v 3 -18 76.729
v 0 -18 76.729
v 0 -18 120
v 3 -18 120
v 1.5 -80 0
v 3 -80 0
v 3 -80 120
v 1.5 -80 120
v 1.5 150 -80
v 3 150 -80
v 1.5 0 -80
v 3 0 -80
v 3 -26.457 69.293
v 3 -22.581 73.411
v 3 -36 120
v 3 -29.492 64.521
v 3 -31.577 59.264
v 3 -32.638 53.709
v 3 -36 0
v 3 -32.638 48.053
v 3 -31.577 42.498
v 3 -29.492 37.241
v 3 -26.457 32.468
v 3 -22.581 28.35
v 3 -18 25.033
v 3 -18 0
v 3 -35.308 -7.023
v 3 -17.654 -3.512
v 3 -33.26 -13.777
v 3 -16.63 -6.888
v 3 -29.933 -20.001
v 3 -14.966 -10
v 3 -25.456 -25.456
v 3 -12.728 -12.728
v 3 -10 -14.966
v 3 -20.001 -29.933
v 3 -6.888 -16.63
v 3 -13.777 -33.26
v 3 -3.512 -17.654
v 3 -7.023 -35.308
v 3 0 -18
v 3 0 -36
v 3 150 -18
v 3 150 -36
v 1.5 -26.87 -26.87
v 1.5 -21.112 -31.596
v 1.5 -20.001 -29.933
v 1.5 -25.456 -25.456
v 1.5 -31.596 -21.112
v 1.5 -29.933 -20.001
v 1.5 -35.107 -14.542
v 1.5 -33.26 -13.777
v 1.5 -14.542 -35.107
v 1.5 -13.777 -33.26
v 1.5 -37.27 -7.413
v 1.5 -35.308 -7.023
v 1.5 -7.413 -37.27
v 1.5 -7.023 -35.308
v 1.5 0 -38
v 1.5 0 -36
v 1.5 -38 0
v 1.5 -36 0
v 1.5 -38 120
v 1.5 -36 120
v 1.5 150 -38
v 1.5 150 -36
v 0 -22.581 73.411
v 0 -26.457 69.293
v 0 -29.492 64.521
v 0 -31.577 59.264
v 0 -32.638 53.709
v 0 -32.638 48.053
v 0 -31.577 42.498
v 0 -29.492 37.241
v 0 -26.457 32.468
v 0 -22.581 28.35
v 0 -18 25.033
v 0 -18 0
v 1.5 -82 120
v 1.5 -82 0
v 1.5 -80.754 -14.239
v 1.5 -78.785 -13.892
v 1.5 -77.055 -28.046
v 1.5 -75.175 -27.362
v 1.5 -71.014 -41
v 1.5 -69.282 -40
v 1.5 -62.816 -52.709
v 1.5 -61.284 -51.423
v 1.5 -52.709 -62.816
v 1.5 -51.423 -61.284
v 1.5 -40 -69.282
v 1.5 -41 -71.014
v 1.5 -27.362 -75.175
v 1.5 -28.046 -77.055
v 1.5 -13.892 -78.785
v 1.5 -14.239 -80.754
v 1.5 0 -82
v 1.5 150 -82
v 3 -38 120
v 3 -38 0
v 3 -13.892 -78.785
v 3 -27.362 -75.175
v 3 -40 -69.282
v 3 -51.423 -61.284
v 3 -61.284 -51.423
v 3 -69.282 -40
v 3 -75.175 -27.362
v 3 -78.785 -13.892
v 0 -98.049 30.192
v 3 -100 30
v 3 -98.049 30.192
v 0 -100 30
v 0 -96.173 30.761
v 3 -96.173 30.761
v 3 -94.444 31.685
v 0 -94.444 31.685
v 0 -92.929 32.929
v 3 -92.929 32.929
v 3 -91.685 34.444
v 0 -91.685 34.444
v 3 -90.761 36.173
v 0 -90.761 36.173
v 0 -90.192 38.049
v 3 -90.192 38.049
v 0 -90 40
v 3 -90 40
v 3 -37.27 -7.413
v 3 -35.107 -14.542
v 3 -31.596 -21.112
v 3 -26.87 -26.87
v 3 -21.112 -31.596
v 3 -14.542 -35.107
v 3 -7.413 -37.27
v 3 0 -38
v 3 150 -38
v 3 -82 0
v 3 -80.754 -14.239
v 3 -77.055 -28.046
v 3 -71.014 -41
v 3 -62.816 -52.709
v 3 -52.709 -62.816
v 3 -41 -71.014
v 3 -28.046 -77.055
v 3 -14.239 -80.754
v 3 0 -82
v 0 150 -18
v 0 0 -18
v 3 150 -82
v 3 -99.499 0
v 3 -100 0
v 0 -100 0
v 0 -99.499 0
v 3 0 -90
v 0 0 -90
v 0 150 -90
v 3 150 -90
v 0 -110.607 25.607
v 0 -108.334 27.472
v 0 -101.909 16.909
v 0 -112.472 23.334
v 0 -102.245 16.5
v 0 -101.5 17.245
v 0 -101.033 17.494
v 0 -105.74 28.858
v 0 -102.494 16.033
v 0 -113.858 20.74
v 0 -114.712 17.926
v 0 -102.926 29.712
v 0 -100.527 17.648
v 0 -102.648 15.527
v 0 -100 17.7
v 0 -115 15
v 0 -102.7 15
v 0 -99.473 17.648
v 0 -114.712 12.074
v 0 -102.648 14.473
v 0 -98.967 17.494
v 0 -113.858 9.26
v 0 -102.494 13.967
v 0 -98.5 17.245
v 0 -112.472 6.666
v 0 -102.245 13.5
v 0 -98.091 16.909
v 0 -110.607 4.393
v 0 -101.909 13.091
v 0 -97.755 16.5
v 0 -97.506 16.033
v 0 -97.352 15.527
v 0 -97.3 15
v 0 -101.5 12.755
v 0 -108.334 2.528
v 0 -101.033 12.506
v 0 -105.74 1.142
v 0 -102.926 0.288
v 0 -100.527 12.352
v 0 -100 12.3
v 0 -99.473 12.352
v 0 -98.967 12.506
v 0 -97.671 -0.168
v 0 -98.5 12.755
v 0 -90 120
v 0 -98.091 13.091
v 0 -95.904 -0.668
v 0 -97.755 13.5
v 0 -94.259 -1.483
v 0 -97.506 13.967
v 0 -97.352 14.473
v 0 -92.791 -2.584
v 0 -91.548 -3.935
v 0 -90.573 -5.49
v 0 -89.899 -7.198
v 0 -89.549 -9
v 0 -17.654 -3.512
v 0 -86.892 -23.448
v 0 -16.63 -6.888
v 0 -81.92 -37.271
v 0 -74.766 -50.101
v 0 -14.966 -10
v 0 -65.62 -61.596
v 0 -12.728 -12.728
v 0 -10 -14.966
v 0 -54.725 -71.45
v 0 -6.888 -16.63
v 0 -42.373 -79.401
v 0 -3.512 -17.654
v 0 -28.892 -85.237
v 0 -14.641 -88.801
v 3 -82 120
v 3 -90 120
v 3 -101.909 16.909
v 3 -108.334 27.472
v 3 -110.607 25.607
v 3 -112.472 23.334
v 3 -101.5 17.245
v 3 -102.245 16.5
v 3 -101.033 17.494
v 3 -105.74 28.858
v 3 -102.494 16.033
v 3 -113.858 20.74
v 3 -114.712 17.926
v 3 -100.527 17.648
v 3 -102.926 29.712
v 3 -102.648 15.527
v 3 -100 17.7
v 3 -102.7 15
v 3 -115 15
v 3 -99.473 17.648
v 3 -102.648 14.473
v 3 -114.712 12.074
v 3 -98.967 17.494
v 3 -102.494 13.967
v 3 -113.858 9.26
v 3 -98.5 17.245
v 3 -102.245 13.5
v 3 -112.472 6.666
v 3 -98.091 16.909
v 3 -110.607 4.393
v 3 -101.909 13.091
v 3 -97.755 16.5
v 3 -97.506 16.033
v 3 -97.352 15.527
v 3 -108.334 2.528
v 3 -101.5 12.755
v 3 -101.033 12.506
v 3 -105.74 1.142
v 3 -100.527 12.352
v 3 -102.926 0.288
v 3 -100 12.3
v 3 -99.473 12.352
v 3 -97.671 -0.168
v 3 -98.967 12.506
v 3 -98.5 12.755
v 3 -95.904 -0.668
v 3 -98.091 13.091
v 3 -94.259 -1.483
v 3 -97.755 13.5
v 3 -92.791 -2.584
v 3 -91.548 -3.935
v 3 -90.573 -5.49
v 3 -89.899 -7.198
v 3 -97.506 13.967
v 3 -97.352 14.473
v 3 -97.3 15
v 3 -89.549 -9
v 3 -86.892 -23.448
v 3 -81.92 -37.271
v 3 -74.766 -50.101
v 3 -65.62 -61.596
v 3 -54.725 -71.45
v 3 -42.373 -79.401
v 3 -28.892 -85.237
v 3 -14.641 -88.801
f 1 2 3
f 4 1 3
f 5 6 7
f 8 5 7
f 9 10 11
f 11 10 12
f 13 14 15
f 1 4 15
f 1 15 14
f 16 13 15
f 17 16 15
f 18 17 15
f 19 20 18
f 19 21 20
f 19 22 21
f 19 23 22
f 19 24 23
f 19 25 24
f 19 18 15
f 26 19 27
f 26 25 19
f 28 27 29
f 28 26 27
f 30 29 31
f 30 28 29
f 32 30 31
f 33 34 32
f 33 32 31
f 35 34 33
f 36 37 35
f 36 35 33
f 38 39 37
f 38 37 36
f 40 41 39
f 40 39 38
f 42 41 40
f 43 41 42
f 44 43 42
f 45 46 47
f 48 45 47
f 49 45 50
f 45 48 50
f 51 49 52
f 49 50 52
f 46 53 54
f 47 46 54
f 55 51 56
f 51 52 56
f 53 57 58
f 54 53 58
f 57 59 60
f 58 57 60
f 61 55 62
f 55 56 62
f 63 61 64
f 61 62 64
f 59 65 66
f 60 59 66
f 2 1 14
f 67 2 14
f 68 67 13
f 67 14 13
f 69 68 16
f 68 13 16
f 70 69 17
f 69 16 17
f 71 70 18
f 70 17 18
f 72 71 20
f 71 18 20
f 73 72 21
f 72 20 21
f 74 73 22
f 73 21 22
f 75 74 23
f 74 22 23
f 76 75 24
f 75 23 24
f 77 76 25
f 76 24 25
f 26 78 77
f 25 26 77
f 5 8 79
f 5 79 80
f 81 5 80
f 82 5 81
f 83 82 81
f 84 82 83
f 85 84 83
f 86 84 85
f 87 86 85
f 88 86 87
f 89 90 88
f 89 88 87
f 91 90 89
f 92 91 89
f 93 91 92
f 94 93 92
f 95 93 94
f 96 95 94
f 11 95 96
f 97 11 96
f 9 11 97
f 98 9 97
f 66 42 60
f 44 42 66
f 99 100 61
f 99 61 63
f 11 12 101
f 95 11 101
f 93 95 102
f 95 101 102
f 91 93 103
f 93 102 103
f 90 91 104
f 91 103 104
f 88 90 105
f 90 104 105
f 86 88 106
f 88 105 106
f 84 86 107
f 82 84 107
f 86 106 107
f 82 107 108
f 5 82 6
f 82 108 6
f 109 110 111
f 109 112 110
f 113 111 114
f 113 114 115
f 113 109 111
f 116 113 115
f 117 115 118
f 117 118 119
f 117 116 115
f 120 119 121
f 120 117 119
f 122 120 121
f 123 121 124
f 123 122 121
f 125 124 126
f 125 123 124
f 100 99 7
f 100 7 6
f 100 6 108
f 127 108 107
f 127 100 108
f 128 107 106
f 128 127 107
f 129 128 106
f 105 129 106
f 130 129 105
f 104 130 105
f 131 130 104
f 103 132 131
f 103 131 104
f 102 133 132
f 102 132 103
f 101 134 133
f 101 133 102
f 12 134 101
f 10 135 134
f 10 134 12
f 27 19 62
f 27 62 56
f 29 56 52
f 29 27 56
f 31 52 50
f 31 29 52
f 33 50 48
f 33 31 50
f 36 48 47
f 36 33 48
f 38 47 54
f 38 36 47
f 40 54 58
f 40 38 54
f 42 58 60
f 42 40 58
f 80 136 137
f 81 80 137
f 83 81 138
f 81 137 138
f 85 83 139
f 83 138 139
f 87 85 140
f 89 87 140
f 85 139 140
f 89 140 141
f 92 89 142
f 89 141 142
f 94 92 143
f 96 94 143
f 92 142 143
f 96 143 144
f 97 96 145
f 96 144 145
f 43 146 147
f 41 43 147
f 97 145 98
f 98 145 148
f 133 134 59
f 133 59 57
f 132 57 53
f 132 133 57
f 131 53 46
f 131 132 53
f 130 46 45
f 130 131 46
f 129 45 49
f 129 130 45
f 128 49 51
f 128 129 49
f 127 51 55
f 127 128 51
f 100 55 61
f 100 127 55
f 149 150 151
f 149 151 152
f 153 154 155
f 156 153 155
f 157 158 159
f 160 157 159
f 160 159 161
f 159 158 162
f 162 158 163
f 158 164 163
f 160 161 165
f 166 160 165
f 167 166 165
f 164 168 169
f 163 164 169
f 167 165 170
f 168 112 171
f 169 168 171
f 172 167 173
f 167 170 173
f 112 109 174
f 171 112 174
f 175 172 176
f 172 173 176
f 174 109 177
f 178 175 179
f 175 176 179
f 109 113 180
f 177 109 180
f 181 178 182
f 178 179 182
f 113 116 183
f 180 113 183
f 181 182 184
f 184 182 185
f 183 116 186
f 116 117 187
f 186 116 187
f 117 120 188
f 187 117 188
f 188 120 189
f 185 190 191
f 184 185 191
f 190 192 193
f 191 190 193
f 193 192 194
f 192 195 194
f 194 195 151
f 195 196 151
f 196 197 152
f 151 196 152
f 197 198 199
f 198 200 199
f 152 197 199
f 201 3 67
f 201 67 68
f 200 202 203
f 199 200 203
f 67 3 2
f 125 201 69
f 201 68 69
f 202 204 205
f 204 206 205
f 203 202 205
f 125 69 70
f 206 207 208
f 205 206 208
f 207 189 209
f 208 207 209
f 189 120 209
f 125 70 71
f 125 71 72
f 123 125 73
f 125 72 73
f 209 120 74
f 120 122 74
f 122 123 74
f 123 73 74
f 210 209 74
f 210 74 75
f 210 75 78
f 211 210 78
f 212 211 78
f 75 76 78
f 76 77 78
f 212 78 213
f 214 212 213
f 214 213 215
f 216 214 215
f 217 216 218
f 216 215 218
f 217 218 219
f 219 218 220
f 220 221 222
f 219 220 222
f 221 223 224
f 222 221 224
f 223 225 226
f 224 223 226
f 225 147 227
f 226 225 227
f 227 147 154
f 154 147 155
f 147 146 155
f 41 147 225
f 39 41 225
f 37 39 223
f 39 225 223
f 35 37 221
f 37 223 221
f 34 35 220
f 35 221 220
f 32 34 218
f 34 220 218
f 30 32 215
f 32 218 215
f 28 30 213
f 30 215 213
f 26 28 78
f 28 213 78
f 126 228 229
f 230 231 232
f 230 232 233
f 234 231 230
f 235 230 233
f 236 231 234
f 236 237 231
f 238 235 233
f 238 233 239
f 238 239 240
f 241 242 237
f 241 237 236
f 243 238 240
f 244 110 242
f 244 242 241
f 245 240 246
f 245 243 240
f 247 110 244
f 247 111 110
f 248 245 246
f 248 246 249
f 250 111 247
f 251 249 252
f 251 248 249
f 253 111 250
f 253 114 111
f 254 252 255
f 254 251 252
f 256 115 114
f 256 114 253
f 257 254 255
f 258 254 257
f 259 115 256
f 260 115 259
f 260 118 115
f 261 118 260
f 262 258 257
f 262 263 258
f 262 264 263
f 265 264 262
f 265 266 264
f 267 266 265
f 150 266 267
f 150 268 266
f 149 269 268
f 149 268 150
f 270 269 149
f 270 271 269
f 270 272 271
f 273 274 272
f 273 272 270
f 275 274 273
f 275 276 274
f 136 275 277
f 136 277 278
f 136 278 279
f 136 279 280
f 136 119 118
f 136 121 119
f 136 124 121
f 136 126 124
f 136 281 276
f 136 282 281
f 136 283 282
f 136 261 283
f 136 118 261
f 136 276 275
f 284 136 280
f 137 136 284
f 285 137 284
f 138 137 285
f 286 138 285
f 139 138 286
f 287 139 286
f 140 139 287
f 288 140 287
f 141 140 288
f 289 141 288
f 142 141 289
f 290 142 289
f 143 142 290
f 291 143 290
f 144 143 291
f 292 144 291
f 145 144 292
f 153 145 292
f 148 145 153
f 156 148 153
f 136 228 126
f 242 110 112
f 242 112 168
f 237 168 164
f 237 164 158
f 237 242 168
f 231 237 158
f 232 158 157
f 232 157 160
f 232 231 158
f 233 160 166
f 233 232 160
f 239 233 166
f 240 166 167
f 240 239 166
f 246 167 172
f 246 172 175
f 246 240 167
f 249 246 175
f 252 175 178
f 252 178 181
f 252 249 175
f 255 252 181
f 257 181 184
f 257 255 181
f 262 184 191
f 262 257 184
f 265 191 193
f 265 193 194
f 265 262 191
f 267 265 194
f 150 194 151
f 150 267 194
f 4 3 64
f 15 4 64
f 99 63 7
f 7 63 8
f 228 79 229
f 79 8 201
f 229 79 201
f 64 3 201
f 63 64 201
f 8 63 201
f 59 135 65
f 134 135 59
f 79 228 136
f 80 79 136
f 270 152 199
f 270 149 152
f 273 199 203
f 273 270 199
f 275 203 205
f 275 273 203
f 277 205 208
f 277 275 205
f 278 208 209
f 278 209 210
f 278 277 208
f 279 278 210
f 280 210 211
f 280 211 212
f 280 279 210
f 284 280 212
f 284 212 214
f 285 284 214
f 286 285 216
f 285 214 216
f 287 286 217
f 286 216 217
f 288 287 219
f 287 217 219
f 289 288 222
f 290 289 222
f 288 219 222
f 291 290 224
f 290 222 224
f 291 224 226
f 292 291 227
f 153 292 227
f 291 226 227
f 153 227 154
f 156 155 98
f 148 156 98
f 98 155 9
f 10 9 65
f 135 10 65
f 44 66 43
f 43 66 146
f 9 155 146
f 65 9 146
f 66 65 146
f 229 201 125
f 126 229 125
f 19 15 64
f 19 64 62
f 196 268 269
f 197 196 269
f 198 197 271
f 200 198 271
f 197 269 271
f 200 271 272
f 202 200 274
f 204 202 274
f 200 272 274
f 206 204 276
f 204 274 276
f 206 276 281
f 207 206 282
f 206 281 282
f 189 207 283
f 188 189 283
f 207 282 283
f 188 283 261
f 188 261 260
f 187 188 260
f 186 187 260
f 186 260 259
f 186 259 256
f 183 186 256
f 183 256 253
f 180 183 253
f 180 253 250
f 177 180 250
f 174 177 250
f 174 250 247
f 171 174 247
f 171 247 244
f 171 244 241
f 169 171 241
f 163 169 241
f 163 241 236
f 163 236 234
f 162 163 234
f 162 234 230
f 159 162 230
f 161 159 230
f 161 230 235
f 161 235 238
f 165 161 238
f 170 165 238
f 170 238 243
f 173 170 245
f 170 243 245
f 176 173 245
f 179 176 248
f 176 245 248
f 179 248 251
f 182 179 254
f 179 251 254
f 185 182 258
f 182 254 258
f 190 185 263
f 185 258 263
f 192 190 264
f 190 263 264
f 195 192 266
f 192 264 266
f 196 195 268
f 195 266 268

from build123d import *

# Parameters (mm, degrees)
BOSS_EXTRUDE1_DEPTH = 3
CUT_EXTRUDE1_DEPTH  = 1.5
BOSS_EXTRUDE2_DEPTH = 3
FILLET1_R           = 10
SKETCH4_R           = 2.7
CUT_EXTRUDE2_DEPTH  = 193.117151759
SKETCH5_R           = 30
CUT_EXTRUDE3_DEPTH  = 193.117151759


with BuildPart() as part:
    # Sketch1 → Boss-Extrude1 (new body)
    with BuildSketch(Plane(origin=(0, 0, 0), x_dir=(0, 0, -1), z_dir=(1, 0, 0))):
        with BuildLine():
            Line((0, -18), (-120, -18))
            Line((-120, -18), (-120, -90))
            Line((-120, -90), (0, -90))
            ThreePointArc((0, -90), (63.639610307, -63.639610307), (90, 0))
            Line((90, 0), (90, 150))
            Line((90, 150), (18, 150))
            Line((18, 150), (18, 0))
            ThreePointArc((18, 0), (12.727922061, -12.727922061), (0, -18))
        make_face()
    extrude(amount=BOSS_EXTRUDE1_DEPTH)

    # Sketch2 → Cut-Extrude1 (cut)
    with BuildSketch(Plane(origin=(3, 0, 0), x_dir=(0, 0, -1), z_dir=(1, 0, 0))):
        with BuildLine():
            Line((0, -38), (-120, -38))
            Line((-120, -38), (-120, -36))
            Line((-120, -36), (0, -36))
            ThreePointArc((0, -36), (25.455844123, -25.455844123), (36, 0))
            Line((36, 0), (36, 150))
            Line((36, 150), (38, 150))
            Line((38, 150), (38, 0))
            ThreePointArc((38, 0), (26.870057685, -26.870057685), (0, -38))
        make_face()
        with BuildLine():
            Line((0, -80), (-120, -80))
            Line((-120, -80), (-120, -82))
            Line((-120, -82), (0, -82))
            ThreePointArc((0, -82), (57.982756057, -57.982756057), (82, 0))
            Line((82, 0), (82, 150))
            Line((82, 150), (80, 150))
            Line((80, 150), (80, 0))
            ThreePointArc((80, 0), (56.568542495, -56.568542495), (0, -80))
        make_face()
    extrude(amount=-CUT_EXTRUDE1_DEPTH, mode=Mode.SUBTRACT)

    # Sketch3 → Boss-Extrude2 (add)
    with BuildSketch(Plane(origin=(3, 0, 0), x_dir=(0, 0, -1), z_dir=(1, 0, 0))):
        with BuildLine():
            Line((-30, -90), (-30, -100))
            ThreePointArc((-30, -100), (-29.012585384, -94.647668653), (-26.180339887, -90))
            Line((-26.180339887, -90), (-30, -90))
        make_face()
        with BuildLine():
            ThreePointArc((-26.180339887, -90), (-29.012585384, -94.647668653), (-30, -100))
            Line((-30, -100), (0, -100))
            ThreePointArc((0, -100), (-0.987414616, -94.647668653), (-3.819660113, -90))
            Line((-3.819660113, -90), (-26.180339887, -90))
        make_face()
        with BuildLine():
            ThreePointArc((-3.819660113, -90), (-0.987414616, -94.647668653), (0, -100))
            Line((0, -100), (0, -90))
            Line((0, -90), (-3.819660113, -90))
        make_face()
        with BuildLine():
            Line((0, -100), (-30, -100))
            ThreePointArc((-30, -100), (-15, -115), (0, -100))
        make_face()
    extrude(amount=-BOSS_EXTRUDE2_DEPTH)

    # Fillet1
    fillet1_edges = [part.edges().sort_by_distance(p)[0] for p in [
        (1.5, -90, 0),
        (1.5, -90, 30),
    ]]
    fillet(fillet1_edges, radius=FILLET1_R - 0.0001)  # a hair under: the kernel refuses the full size

    # Sketch4 → Cut-Extrude2 (cut, through all)
    with BuildSketch(Plane(origin=(3, 0, 0), x_dir=(0, 0, -1), z_dir=(1, 0, 0))):
        with Locations((-15, -100)):
            Circle(SKETCH4_R)
    extrude(amount=-CUT_EXTRUDE2_DEPTH, mode=Mode.SUBTRACT)

    # Sketch5 → Cut-Extrude3 (cut, through all)
    with BuildSketch(Plane(origin=(3, 0, 0), x_dir=(0, 0, -1), z_dir=(1, 0, 0))):
        with Locations((-50.880906171, -2.772036536)):
            Circle(SKETCH5_R)
    extrude(amount=-CUT_EXTRUDE3_DEPTH, mode=Mode.SUBTRACT)


solid = part.part
